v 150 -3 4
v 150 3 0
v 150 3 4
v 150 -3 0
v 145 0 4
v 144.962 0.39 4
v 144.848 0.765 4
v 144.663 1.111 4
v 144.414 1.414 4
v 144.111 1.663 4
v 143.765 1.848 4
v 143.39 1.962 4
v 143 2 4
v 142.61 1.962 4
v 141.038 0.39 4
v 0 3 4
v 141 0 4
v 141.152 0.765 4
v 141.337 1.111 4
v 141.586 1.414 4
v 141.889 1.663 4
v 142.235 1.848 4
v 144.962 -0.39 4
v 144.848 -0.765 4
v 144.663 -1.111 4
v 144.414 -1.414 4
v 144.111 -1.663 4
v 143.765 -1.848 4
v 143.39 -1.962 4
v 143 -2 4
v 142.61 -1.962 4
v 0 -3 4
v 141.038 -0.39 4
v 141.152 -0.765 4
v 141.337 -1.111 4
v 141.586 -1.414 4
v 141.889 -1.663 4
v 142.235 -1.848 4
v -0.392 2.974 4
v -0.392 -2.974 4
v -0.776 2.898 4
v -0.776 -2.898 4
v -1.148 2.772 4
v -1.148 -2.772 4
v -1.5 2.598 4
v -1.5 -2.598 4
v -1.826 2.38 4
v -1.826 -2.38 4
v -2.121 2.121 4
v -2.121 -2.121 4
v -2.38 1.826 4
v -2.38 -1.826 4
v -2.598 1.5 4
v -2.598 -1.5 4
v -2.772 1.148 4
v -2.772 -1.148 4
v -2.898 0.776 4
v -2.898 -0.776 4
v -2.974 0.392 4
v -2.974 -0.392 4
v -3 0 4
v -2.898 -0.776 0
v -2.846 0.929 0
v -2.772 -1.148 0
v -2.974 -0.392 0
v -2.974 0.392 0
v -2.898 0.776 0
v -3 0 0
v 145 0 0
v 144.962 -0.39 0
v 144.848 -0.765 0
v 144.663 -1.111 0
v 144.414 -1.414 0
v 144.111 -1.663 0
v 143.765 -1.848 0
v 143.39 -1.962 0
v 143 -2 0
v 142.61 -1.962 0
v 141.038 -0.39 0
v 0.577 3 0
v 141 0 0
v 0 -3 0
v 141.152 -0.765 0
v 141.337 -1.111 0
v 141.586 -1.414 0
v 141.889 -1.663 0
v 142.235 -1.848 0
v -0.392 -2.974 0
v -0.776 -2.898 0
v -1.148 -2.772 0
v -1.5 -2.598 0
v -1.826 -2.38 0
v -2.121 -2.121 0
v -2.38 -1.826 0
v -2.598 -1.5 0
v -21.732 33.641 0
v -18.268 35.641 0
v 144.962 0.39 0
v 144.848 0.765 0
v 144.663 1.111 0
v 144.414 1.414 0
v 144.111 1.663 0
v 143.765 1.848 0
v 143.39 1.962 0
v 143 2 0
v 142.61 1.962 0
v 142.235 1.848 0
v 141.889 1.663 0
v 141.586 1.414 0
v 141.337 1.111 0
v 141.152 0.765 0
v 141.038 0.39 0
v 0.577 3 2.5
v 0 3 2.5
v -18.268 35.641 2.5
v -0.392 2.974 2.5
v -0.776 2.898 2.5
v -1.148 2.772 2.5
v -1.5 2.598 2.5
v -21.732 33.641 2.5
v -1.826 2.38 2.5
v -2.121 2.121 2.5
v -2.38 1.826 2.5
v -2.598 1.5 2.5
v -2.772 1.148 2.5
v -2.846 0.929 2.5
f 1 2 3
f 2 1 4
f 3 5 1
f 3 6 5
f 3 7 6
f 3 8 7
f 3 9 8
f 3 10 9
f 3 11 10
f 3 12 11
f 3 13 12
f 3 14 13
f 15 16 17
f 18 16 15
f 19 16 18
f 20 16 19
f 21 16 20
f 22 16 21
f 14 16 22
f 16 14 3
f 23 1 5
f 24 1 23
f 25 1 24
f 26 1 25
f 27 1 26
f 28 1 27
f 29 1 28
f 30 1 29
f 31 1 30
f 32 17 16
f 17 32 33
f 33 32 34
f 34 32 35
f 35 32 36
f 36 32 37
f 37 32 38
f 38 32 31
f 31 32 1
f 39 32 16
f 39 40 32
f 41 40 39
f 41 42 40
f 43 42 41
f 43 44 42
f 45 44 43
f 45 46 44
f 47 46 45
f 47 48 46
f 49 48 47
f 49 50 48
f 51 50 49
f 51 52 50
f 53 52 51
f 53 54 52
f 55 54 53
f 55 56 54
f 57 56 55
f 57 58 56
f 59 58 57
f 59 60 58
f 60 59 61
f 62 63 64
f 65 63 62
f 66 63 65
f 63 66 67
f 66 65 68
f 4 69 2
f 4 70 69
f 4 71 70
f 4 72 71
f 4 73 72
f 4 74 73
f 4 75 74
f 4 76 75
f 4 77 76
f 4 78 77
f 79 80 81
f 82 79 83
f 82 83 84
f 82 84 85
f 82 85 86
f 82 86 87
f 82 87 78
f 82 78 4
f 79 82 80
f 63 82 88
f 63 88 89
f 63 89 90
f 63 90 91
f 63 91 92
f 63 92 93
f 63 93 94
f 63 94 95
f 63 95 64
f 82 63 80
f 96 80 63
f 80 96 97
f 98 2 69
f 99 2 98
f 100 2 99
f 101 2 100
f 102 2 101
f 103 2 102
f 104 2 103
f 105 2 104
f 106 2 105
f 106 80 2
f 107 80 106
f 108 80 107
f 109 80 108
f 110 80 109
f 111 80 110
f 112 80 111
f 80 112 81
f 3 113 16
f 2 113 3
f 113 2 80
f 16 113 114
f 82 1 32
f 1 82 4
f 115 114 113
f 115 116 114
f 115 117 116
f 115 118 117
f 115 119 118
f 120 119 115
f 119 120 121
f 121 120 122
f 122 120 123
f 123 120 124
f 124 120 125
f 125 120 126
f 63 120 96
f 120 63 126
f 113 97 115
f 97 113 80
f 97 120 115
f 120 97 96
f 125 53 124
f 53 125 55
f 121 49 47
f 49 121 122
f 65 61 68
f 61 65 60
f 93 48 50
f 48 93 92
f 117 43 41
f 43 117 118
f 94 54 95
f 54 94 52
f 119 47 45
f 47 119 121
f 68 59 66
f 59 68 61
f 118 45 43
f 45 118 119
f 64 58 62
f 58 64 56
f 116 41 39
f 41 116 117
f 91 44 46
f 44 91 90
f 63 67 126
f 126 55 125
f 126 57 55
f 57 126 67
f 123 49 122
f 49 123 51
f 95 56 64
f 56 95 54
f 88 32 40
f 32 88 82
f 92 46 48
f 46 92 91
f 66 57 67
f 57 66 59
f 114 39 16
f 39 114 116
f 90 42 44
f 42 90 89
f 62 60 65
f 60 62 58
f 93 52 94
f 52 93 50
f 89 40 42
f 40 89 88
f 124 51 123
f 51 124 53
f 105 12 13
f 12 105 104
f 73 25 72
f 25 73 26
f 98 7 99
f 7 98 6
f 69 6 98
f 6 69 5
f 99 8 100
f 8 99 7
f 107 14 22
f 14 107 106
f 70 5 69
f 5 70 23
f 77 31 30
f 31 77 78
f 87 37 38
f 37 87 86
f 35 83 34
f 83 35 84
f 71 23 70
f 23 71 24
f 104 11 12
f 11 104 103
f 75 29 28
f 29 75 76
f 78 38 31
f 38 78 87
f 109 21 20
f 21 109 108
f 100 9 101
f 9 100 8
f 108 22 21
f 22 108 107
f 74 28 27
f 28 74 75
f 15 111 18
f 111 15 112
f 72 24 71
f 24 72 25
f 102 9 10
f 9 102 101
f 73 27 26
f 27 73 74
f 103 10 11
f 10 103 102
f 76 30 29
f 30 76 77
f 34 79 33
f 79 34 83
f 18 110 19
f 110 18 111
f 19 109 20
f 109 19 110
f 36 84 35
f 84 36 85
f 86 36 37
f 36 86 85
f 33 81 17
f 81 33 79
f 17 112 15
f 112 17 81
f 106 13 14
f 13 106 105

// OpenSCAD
// KNOWN-WRONG PART (must fail): the foot is 4 mm wide instead of 5
// L-shaped ("hockey-stick") cell spreader for plating bacteria
// Category: tools. A flat handle and a thinner spreading foot at 120 degrees, joined by a round
// boss; the foot's bed side is the smooth spreading face. Hanging hole at the handle end.
// Print: PETG or PP, lying flat, 0.15 mm layers, 100 % infill; sterilise with 70 % ethanol
// (or autoclave only if printed in PP).
// SPDX-License-Identifier: CERN-OHL-P-2.0

/* [Spreader] */
handle = [150, 6, 4];     // length (X), width (Y), thickness (Z)
foot = [40, 4, 2.5];      // length along its centre line, width, thickness
foot_angle = 120;         // counter-clockwise from +X, seen from above
boss_d = 6;               // joins the bars at the origin, full handle thickness
hole_d = 4;
hole_x = 143;

/* [Hidden] */
eps = 0.01;

difference() {
    union() {
        translate([0, -handle.y / 2, 0]) cube(handle);
        rotate([0, 0, foot_angle]) translate([0, -foot.y / 2, 0]) cube(foot);
        cylinder(d = boss_d, h = handle.z, $fn = 48);
    }
    translate([hole_x, 0, -1]) cylinder(d = hole_d, h = handle.z + 2, $fn = 32);
}
